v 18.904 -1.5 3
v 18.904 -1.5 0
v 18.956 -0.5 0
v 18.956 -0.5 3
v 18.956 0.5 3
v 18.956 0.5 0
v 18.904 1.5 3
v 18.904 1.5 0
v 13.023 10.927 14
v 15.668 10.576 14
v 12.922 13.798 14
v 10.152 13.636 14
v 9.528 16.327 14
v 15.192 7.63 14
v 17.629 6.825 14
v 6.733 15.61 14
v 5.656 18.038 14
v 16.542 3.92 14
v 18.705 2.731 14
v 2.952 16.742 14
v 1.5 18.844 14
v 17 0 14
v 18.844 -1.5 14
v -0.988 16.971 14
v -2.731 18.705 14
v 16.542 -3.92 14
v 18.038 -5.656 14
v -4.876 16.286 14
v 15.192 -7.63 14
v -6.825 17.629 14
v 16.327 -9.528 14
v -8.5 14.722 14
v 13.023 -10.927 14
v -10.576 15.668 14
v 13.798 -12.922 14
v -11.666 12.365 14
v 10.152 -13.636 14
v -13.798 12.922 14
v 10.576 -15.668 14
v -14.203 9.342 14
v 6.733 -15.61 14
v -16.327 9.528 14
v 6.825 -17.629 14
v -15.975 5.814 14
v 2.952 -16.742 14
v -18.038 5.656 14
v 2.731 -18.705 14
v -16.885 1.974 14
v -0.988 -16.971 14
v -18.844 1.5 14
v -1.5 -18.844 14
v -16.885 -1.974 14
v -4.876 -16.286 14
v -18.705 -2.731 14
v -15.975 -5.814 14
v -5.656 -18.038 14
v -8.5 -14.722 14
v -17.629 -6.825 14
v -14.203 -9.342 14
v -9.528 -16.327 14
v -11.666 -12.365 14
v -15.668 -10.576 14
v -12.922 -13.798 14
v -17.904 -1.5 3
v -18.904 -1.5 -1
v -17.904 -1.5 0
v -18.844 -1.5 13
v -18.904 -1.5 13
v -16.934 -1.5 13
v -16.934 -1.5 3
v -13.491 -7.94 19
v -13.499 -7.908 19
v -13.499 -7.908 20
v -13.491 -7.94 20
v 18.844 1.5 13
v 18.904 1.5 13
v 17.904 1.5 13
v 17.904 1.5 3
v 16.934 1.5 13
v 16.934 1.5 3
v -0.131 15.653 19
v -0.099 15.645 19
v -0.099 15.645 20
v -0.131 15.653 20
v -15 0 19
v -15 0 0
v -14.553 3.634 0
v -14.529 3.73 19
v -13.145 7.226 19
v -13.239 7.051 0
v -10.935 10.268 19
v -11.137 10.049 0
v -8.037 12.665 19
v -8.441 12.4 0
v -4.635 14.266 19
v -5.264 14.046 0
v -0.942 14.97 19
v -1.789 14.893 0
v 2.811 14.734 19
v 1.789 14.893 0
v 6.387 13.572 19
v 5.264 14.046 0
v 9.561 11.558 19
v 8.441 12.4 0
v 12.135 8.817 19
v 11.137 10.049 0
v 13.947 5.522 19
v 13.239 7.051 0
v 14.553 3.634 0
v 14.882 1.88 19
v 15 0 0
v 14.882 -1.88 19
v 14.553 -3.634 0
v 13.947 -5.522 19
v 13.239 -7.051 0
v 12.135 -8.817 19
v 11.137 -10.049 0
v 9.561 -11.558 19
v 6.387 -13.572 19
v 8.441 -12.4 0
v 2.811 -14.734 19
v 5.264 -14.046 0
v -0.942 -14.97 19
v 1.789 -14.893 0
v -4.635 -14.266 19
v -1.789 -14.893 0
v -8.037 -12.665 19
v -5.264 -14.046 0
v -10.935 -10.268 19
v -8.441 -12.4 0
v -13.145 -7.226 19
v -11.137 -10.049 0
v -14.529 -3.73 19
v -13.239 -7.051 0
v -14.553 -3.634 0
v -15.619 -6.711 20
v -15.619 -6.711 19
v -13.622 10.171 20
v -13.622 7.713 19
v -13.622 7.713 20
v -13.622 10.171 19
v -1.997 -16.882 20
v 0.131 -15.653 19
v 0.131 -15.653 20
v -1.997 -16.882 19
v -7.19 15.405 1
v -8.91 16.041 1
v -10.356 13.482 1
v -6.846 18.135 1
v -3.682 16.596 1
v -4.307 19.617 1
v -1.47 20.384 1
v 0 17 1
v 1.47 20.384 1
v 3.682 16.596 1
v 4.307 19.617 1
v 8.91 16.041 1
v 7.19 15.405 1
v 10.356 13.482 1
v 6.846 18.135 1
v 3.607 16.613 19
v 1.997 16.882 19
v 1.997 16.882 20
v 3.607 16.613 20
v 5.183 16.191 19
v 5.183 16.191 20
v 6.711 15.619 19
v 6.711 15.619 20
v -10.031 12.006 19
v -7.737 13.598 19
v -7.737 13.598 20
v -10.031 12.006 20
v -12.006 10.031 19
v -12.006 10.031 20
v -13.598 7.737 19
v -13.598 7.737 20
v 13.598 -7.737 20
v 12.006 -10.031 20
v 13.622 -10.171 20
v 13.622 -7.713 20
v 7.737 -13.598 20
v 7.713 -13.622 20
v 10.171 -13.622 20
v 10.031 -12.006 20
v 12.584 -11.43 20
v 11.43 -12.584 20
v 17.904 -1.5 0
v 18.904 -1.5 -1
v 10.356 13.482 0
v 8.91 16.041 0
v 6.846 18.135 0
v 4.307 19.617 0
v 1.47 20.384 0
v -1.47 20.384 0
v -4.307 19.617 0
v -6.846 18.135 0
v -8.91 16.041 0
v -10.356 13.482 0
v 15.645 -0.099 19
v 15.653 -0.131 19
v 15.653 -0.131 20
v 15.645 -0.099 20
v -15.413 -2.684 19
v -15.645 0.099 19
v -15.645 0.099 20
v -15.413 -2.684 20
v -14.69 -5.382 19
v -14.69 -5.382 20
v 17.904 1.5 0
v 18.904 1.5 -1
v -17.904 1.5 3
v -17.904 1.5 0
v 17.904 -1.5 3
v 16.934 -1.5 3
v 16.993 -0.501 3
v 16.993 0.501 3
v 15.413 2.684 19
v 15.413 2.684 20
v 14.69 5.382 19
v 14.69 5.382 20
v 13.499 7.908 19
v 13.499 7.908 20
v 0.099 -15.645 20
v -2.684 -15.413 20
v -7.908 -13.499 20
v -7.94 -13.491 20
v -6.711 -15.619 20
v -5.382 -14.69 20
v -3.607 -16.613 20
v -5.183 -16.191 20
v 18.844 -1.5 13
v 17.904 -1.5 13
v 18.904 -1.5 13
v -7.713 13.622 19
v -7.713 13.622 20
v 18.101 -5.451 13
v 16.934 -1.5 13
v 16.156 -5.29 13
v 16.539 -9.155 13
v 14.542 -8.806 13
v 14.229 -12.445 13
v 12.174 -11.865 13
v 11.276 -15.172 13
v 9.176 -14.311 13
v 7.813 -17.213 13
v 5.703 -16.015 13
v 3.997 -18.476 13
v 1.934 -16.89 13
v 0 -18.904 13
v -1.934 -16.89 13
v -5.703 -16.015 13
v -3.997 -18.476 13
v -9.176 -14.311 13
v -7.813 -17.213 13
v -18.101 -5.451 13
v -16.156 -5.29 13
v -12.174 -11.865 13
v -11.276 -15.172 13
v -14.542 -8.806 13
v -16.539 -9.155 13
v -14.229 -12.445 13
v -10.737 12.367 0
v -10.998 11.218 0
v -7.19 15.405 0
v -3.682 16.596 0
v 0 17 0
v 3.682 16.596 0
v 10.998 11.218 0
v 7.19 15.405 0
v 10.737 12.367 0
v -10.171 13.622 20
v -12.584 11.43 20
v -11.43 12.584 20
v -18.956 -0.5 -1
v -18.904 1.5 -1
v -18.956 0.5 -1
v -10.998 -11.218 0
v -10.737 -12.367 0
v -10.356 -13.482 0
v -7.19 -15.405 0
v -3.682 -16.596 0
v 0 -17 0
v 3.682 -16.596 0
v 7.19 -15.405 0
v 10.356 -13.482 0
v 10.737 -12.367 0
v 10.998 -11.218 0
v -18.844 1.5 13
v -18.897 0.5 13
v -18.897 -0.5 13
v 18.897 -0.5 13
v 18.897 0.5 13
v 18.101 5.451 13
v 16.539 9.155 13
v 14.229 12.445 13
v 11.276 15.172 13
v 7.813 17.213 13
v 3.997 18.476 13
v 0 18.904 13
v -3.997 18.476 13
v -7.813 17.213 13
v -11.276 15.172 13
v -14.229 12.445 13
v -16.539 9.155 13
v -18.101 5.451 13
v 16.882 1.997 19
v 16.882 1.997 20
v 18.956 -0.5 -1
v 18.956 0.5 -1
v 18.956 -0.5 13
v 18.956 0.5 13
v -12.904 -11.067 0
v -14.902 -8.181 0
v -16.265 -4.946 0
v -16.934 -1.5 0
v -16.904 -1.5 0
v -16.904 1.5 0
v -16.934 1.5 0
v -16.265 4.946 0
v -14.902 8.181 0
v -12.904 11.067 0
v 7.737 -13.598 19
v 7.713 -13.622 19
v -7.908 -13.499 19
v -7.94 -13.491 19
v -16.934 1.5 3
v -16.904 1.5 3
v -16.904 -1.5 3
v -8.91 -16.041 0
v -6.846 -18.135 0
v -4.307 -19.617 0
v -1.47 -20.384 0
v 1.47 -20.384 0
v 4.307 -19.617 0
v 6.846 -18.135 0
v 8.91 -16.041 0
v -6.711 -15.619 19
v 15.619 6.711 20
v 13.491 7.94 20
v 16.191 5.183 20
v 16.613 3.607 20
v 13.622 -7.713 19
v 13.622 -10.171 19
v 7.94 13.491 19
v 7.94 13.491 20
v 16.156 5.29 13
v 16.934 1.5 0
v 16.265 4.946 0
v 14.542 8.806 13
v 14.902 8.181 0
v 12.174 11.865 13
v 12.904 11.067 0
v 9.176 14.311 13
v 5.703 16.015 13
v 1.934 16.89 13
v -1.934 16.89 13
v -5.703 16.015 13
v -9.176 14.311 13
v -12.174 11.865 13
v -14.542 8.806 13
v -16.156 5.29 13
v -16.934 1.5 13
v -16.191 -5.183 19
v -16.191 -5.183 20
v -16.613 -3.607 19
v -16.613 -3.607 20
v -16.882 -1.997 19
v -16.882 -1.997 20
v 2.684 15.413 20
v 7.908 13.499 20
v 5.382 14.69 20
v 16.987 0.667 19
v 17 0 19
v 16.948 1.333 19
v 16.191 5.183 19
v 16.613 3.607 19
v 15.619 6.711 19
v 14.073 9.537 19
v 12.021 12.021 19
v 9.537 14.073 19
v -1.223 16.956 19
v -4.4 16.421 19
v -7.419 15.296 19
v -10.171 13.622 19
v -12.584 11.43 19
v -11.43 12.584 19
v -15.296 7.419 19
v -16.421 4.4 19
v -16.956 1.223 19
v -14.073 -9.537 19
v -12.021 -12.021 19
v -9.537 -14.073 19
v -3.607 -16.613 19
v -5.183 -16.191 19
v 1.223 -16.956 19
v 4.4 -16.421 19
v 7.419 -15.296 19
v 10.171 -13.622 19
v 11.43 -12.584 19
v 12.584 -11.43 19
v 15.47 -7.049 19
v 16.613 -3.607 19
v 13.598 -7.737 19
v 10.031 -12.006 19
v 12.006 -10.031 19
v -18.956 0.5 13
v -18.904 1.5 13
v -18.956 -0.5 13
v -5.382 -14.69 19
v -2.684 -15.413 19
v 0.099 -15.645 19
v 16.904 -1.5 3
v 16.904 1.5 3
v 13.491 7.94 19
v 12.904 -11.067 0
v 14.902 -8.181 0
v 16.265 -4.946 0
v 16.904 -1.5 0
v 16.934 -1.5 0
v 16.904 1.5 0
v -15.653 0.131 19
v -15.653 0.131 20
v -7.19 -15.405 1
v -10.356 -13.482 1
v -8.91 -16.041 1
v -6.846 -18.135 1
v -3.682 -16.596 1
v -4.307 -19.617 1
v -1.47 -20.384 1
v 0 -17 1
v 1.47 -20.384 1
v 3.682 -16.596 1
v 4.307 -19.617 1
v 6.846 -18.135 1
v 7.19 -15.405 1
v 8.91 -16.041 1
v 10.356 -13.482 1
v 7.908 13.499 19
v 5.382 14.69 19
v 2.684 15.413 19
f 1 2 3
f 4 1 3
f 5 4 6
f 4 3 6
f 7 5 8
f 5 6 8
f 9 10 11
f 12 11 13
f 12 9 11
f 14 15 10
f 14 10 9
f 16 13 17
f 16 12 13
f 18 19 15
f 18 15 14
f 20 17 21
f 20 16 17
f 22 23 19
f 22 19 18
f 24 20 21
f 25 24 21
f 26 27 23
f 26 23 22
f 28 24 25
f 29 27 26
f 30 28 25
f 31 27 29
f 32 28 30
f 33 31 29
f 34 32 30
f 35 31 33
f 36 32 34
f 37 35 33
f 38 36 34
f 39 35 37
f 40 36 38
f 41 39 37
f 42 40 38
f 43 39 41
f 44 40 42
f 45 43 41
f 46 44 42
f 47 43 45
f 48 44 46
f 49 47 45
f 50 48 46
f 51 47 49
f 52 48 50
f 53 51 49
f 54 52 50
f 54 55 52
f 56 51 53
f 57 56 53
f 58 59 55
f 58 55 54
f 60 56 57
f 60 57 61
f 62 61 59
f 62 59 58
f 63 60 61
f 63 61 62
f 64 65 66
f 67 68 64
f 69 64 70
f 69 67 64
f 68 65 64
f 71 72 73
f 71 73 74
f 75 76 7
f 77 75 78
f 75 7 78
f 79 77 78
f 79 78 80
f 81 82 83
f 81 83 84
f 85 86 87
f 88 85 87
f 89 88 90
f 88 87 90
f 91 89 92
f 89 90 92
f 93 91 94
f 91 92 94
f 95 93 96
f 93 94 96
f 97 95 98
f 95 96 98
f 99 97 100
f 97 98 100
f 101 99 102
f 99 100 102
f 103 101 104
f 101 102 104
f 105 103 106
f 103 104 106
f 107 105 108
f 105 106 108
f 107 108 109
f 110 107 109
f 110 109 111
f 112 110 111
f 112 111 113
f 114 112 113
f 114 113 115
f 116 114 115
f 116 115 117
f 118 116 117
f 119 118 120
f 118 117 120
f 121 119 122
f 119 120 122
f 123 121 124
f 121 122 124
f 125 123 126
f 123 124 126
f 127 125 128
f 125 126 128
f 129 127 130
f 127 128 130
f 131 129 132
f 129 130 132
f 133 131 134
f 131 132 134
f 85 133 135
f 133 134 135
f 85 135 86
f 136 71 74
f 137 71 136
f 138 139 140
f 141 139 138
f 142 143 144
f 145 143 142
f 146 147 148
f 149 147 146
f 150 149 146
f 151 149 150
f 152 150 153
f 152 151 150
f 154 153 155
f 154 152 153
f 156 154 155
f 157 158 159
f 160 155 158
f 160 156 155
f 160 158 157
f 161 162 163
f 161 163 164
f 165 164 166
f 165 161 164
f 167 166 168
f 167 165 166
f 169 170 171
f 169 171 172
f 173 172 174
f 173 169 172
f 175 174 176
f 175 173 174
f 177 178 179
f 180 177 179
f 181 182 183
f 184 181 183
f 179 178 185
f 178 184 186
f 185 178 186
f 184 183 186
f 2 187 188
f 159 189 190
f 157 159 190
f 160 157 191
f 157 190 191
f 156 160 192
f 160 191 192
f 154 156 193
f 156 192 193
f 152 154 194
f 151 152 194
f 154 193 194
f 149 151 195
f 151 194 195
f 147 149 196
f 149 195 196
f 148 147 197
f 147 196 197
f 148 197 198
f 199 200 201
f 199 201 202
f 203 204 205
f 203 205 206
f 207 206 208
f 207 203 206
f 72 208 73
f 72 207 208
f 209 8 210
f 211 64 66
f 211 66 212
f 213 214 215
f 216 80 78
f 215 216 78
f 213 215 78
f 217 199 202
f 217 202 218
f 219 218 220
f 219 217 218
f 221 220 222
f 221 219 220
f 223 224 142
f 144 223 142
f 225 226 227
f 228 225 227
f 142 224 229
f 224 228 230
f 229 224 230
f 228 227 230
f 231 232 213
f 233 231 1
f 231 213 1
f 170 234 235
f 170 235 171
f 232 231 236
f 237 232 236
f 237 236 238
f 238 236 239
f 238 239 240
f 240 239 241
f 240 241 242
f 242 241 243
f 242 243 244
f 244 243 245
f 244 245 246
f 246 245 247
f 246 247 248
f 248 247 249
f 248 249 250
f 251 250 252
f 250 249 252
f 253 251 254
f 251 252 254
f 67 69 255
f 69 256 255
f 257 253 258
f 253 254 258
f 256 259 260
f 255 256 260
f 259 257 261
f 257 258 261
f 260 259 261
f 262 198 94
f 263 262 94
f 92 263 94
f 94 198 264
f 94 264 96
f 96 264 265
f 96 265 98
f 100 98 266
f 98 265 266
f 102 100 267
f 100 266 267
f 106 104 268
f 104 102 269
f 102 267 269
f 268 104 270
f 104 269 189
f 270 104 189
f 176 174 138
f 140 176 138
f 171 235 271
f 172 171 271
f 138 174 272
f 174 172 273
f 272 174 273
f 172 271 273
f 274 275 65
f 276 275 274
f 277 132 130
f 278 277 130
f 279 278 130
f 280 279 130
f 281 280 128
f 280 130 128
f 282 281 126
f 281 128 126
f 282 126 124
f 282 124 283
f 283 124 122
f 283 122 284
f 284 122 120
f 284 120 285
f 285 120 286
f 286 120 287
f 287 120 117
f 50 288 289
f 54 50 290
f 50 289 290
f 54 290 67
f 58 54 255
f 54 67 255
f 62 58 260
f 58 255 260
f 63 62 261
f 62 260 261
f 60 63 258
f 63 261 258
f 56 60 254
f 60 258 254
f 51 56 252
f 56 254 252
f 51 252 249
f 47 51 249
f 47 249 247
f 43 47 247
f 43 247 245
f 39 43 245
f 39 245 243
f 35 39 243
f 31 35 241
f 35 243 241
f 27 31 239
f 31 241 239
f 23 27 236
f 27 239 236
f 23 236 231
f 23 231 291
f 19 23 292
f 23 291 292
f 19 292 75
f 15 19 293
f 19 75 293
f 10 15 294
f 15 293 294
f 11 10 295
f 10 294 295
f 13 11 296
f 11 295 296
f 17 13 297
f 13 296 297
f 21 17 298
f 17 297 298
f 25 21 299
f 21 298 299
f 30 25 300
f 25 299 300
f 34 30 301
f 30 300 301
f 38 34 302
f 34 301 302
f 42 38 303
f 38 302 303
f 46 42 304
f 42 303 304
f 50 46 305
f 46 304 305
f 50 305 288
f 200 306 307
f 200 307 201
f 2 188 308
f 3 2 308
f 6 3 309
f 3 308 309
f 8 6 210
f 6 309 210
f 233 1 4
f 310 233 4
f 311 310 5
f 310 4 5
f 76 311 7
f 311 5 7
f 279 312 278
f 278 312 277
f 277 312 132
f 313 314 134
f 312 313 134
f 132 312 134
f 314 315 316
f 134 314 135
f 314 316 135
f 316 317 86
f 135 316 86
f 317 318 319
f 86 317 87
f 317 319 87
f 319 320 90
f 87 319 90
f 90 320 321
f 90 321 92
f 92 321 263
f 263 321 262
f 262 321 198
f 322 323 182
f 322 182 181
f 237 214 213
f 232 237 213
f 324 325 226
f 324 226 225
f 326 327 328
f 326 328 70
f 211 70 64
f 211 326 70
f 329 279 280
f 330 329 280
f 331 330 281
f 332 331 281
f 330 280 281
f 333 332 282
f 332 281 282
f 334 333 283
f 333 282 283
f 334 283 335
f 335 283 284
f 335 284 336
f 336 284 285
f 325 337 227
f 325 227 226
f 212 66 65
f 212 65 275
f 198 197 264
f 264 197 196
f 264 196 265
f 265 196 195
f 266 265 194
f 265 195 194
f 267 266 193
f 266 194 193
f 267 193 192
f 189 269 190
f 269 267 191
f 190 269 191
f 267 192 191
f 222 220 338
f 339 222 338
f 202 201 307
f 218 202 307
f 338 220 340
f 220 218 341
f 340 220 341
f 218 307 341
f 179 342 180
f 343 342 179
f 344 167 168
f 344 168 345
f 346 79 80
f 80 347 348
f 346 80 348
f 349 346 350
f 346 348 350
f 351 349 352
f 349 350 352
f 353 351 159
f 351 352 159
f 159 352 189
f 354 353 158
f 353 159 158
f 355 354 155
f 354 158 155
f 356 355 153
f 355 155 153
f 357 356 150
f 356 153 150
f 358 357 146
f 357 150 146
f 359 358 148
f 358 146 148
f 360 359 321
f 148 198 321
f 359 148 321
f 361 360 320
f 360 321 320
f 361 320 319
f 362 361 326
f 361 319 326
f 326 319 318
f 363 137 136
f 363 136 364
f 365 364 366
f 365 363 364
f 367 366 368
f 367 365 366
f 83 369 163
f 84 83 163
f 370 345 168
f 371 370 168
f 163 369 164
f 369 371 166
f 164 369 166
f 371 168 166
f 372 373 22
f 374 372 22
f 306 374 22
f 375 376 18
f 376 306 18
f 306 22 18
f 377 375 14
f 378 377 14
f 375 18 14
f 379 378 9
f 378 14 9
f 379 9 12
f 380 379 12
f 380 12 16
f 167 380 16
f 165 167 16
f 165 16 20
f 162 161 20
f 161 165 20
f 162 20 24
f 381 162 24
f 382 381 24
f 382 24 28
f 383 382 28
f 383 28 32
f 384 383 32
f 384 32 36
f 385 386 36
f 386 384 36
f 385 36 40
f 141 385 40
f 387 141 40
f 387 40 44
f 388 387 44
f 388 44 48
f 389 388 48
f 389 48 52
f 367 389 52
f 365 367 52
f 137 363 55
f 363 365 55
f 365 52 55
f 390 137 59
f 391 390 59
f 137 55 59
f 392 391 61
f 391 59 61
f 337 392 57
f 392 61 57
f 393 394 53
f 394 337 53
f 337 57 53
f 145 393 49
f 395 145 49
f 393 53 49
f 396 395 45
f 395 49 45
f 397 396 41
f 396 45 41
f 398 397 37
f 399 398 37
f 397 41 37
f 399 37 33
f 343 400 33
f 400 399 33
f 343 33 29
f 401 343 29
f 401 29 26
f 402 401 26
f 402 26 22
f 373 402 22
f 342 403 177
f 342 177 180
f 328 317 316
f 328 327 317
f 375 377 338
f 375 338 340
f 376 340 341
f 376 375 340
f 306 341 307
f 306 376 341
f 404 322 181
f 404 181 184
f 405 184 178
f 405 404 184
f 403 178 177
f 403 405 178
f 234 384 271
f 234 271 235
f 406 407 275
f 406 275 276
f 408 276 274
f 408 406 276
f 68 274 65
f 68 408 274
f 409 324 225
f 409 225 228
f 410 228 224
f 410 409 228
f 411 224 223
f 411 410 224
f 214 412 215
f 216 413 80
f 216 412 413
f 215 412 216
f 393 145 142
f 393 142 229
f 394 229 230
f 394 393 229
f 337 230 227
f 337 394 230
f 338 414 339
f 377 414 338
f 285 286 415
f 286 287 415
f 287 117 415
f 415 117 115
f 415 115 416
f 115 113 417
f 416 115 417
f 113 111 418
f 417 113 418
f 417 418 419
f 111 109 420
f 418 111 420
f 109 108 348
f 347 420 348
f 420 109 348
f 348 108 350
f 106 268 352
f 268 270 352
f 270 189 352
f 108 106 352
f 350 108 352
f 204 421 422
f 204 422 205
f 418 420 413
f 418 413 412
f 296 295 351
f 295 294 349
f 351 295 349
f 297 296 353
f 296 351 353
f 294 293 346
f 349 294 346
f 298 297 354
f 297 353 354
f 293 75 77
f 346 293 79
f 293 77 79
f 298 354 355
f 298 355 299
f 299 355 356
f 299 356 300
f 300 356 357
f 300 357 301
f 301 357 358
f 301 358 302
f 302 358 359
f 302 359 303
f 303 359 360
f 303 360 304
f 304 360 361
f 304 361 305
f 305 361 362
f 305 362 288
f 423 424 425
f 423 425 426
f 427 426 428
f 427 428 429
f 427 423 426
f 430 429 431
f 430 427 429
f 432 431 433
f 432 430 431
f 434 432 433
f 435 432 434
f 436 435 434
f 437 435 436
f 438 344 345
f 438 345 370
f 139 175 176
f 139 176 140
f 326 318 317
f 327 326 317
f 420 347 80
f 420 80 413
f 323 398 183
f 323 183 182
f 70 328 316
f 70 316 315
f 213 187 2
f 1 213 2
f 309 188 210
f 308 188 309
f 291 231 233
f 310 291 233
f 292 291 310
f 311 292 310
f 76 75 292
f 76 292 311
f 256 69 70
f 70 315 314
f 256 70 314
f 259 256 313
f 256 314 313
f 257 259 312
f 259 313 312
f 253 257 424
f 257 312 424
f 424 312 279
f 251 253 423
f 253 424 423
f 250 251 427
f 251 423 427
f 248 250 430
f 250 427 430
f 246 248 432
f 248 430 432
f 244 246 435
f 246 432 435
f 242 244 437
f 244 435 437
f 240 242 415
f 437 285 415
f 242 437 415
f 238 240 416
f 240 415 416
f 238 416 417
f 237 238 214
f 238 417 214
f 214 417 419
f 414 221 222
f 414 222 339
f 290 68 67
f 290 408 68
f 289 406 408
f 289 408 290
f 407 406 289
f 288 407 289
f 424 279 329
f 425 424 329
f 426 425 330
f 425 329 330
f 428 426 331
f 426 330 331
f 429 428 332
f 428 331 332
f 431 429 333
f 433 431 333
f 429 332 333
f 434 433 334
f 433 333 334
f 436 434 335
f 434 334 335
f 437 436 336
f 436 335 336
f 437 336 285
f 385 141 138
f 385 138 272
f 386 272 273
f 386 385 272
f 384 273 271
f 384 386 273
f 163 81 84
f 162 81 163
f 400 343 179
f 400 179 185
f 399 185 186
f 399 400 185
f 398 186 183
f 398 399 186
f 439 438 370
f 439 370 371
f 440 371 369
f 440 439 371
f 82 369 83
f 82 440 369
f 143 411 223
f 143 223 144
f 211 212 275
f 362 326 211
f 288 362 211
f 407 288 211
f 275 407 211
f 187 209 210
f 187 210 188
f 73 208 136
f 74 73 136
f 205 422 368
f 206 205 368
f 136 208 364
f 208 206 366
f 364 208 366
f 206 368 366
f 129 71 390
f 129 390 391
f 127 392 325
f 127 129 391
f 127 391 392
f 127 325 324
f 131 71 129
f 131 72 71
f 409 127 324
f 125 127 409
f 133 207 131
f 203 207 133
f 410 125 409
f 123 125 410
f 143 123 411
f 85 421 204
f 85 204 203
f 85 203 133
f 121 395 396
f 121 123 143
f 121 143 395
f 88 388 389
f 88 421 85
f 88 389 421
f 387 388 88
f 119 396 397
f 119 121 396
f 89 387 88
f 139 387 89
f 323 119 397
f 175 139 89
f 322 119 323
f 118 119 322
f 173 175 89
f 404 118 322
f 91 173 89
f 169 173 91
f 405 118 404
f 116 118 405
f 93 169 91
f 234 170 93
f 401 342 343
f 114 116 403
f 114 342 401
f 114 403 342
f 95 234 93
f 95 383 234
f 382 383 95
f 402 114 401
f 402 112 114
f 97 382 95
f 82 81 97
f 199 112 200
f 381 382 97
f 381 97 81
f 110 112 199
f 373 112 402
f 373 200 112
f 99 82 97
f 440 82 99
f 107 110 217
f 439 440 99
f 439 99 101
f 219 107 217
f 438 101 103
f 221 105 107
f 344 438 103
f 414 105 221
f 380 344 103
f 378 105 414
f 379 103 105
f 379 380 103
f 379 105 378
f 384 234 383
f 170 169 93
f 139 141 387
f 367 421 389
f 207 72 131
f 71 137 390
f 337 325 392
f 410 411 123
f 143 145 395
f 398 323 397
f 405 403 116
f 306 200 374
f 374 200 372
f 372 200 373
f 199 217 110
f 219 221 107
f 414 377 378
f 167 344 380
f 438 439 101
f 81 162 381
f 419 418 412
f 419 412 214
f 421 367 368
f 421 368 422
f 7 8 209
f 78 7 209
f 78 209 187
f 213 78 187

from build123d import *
from OCP.BRepAlgoAPI import BRepAlgoAPI_Cut
from OCP.TopTools import TopTools_ListOfShape
from build123d.topology import SkipClean

# Parameters (mm, degrees)
SKETCH1_R           = 17
BOSS_EXTRUDE1_DEPTH = 19
BOSS_EXTRUDE3_DEPTH = 1
CIRPATTERN1_COUNT   = 6
BOSS_EXTRUDE4_START = -13
BOSS_EXTRUDE4_DEPTH = 14
CUT_EXTRUDE3_START  = -4
CUT_EXTRUDE3_DEPTH  = 4
CHAMFER1_SIZE       = 1
MIRROR1_START       = -1
MIRROR1_DEPTH       = 4
MIRROR1_START_2     = 3
MIRROR1_2_DEPTH     = 10
MIRROR1_3_DEPTH     = 3
MIRROR1_4_DEPTH     = 10
MIRROR1_5_DEPTH     = 1
MIRROR1_START_3     = 11.973929824
MIRROR1_6_OUTLINE_W = 2.659800733000001
MIRROR1_6_OUTLINE_H = 4.5
MIRROR1_6_DEPTH     = 2.142099975
SKETCH7_R           = 18.903661893109657
BOSS_EXTRUDE5_DEPTH = 1
BOSS_EXTRUDE7_DEPTH = 1
SKETCH2_R           = 15.000000000000002
CUT_EXTRUDE5_DEPTH  = 39


with BuildPart() as part:
    # Sketch1 → Boss-Extrude1 (new body)
    with BuildSketch(Plane.XY):
        Circle(SKETCH1_R)
    extrude(amount=BOSS_EXTRUDE1_DEPTH)

    # Sketch4 → Boss-Extrude3 (add)
    with SkipClean():  # the faces are left unmerged after this step: merging them gives an invalid solid
        with BuildSketch(Plane.XY.offset(19)):
            with BuildLine():
                Line((-10.170952539104004, 13.621737203723095), (-7.713345385435483, 13.621737203723095))
                Line((-7.713345385435483, 13.621737203723095), (-7.736883673253982, 13.598198915904591))
                ThreePointArc((-7.736883673253982, 13.598198915904591), (-11.062784069346495, 11.062784069346478), (-13.598198915904605, 7.736883673253956))
                Line((-13.598198915904605, 7.736883673253956), (-13.621737203723118, 7.7133453854354475))
                Line((-13.621737203723118, 7.7133453854354475), (-13.621737203723118, 10.17095253910397))
                ThreePointArc((-13.621737203723118, 10.17095253910397), (-12.020815280171325, 12.020815280171297), (-10.170952539104004, 13.621737203723095))
            make_face()
        boss_extrude3 = extrude(amount=BOSS_EXTRUDE3_DEPTH)

    # CirPattern1: Boss-Extrude3 ×6 about axis
    with SkipClean():  # the faces are left unmerged after this step: merging them gives an invalid solid
        cirpattern1_axis = Axis((-2.8e-16, 1e-17, 0), (0, 0, 1))
        for i in range(1, CIRPATTERN1_COUNT):
            add(boss_extrude3.rotate(cirpattern1_axis, i * 360 / CIRPATTERN1_COUNT))

    # Sketch5 → Boss-Extrude4 (add)
    with SkipClean():  # the faces are left unmerged after this step: merging them gives an invalid solid
        with BuildSketch(Plane(origin=(0, 0, 0), x_dir=(-1, 0, 0), z_dir=(0, 0, -1)).offset(BOSS_EXTRUDE4_START)):
            with BuildLine():
                Line((16.903661893109657, 1.5), (18.903661893109657, 1.5))
                ThreePointArc((18.903661893109657, 1.5), (18.963080787915402, 0), (18.903661893109657, -1.5))
                Line((18.903661893109657, -1.5), (16.903661893109657, -1.5))
                Line((16.903661893109657, -1.5), (16.903661893109657, 1.5))
            make_face()
        extrude(amount=BOSS_EXTRUDE4_DEPTH)


with BuildPart() as cut_extrude3_tool:
    # Cut-Extrude3: read off the stored shape, not the designer's step
    # Cut-Extrude3 outline → Cut-Extrude3 (new body)
    with BuildSketch(Plane(origin=(0, 0, -1), x_dir=(-1, 0, 0), z_dir=(0, 0, -1)).offset(CUT_EXTRUDE3_START)):
        Polygon((17.903661893, 1.5), (16.903661893, 1.500007564), (16.903661893, -1.5), (17.903661893, -1.5), align=None)
    extrude(amount=CUT_EXTRUDE3_DEPTH)


with BuildPart() as part_1:
    add(part.part)

    # Cut-Extrude3: cut by cut_extrude3_tool, with a tolerance
    cut_extrude3_stock = TopTools_ListOfShape()
    cut_extrude3_stock.Append(part_1.part.wrapped)
    cut_extrude3_tools = TopTools_ListOfShape()
    cut_extrude3_tools.Append(cut_extrude3_tool.part.wrapped)
    cut_extrude3_cut = BRepAlgoAPI_Cut()
    cut_extrude3_cut.SetArguments(cut_extrude3_stock)
    cut_extrude3_cut.SetTools(cut_extrude3_tools)
    cut_extrude3_cut.SetFuzzyValue(0.00001)
    cut_extrude3_cut.Build()
    add(Compound.cast(cut_extrude3_cut.Shape()).solids(), mode=Mode.REPLACE)

    # Chamfer1
    chamfer1_edges = [part_1.edges().sort_by_distance(p)[0] for p in [
        (-17.903661893, 0, -1),
    ]]
    chamfer(chamfer1_edges, length=CHAMFER1_SIZE)


with BuildPart() as mirror1_tool:
    # Mirror1: read off the stored shape, not the designer's step
    # Mirror1 outline → Mirror1 (new body)
    with BuildSketch(Plane.XY.offset(MIRROR1_START)):
        Polygon((16.903661893, -1.5), (17.903661893, -1.5), (17.903661893, 1.5), (16.933693552, 1.5), (16.903661893, 1.500015127), align=None)
    extrude(amount=MIRROR1_DEPTH)


with BuildPart() as part_2:
    add(part_1.part)

    # Mirror1: cut by mirror1_tool, with a tolerance
    mirror1_stock = TopTools_ListOfShape()
    mirror1_stock.Append(part_2.part.wrapped)
    mirror1_tools = TopTools_ListOfShape()
    mirror1_tools.Append(mirror1_tool.part.wrapped)
    mirror1_cut = BRepAlgoAPI_Cut()
    mirror1_cut.SetArguments(mirror1_stock)
    mirror1_cut.SetTools(mirror1_tools)
    mirror1_cut.SetFuzzyValue(0.00001)
    mirror1_cut.Build()
    add(Compound.cast(mirror1_cut.Shape()).solids(), mode=Mode.REPLACE)


with BuildPart() as mirror1_2_tool:
    # Mirror1 2 outline → Mirror1 2 (new body)
    with SkipClean():  # the faces are left unmerged after this step: merging them gives an invalid solid
        with BuildSketch(Plane.XY.offset(MIRROR1_START_2)):
            Polygon((16.903661893, -1.5), (17.903661893, -1.5), (17.903661893, 1.5), (16.933693552, 1.5), (16.903661893, 1.500015127), align=None)
            with BuildLine():
                Line((17.903661893, 1.5), (17.903661893, -1.5))
                Line((17.903661893, -1.5), (18.903661893, -1.5))
                ThreePointArc((18.903661893, -1.5), (18.963080788, 0), (18.903661893, 1.5))
                Line((18.903661893, 1.5), (17.903661893, 1.5))
            make_face()
        extrude(amount=MIRROR1_2_DEPTH)


with BuildPart() as part_3:
    with SkipClean():  # the faces are left unmerged after this step: merging them gives an invalid solid
        add(part_2.part)


with BuildPart() as part_4:
    # Mirror1 2: joined with mirror1_2_tool
    with SkipClean():  # the faces are left unmerged after this step: merging them gives an invalid solid
        add(part_3.part.fuse(mirror1_2_tool.part, tol=0.00001))


with BuildPart() as mirror1_3_tool:
    # Mirror1 3 outline → Mirror1 3 (new body)
    with SkipClean():  # the faces are left unmerged after this step: merging them gives an invalid solid
        with BuildSketch(Plane.XY):
            with BuildLine():
                Line((17.903661893, 1.5), (17.903661893, -1.5))
                Line((17.903661893, -1.5), (18.903661893, -1.5))
                ThreePointArc((18.903661893, -1.5), (18.963080788, 0), (18.903661893, 1.5))
                Line((18.903661893, 1.5), (17.903661893, 1.5))
            make_face()
        extrude(amount=MIRROR1_3_DEPTH)


with BuildPart() as part_5:
    with SkipClean():  # the faces are left unmerged after this step: merging them gives an invalid solid
        add(part_4.part)


with BuildPart() as part_6:
    # Mirror1 3: joined with mirror1_3_tool
    with SkipClean():  # the faces are left unmerged after this step: merging them gives an invalid solid
        add(part_5.part.fuse(mirror1_3_tool.part, tol=0.00001))


with BuildPart() as mirror1_4_tool:
    # Mirror1 4 outline → Mirror1 4 (new body)
    with SkipClean():  # the faces are left unmerged after this step: merging them gives an invalid solid
        with BuildSketch(Plane.XY.offset(MIRROR1_START_2)):
            with BuildLine():
                ThreePointArc((16.933693952, 1.500003049), (17, 1.53e-06), (16.933694222, -1.5))
                Line((16.933694222, -1.5), (18.903661893, -1.5))
                ThreePointArc((18.903661893, -1.5), (18.963080788, 0), (18.903661893, 1.5))
                Line((18.903661893, 1.5), (16.933693952, 1.500003049))
            make_face()
        extrude(amount=MIRROR1_4_DEPTH)


with BuildPart() as part_7:
    with SkipClean():  # the faces are left unmerged after this step: merging them gives an invalid solid
        add(part_6.part)


with BuildPart() as part_8:
    # Mirror1 4: joined with mirror1_4_tool
    with SkipClean():  # the faces are left unmerged after this step: merging them gives an invalid solid
        add(part_7.part.fuse(mirror1_4_tool.part, tol=0.00001))


with BuildPart() as mirror1_5_tool:
    # Mirror1 5 outline → Mirror1 5 (new body)
    with SkipClean():  # the faces are left unmerged after this step: merging them gives an invalid solid
        with BuildSketch(Plane.XY.offset(MIRROR1_START)):
            with BuildLine():
                ThreePointArc((16.933693952, 1.500003049), (17, 1.53e-06), (16.933694222, -1.5))
                Line((16.933694222, -1.5), (18.903661893, -1.5))
                ThreePointArc((18.903661893, -1.5), (18.963080788, 0), (18.903661893, 1.5))
                Line((18.903661893, 1.5), (16.933693952, 1.500003049))
            make_face()
        extrude(amount=MIRROR1_5_DEPTH)


with BuildPart() as part_9:
    with SkipClean():  # the faces are left unmerged after this step: merging them gives an invalid solid
        add(part_8.part)


with BuildPart() as part_10:
    # Mirror1 5: joined with mirror1_5_tool
    with SkipClean():  # the faces are left unmerged after this step: merging them gives an invalid solid
        add(part_9.part.fuse(mirror1_5_tool.part, tol=0.00001))


with BuildPart() as mirror1_6_tool:
    # Mirror1 6 outline → Mirror1 6 (new body)
    with BuildSketch(Plane(origin=(0, 0, 0), x_dir=(0.707106781186545, 0, 0.70710678118655), z_dir=(0.70710678118655, 0, -0.707106781186545)).offset(MIRROR1_START_3)):
        with Locations((11.3299003665, 0.75)):
            Rectangle(MIRROR1_6_OUTLINE_W, MIRROR1_6_OUTLINE_H)
    extrude(amount=MIRROR1_6_DEPTH)


with BuildPart() as part_11:
    add(part_10.part)

    # Mirror1 6: cut by mirror1_6_tool, with a tolerance
    mirror1_6_stock = TopTools_ListOfShape()
    mirror1_6_stock.Append(part_11.part.wrapped)
    mirror1_6_tools = TopTools_ListOfShape()
    mirror1_6_tools.Append(mirror1_6_tool.part.wrapped)
    mirror1_6_cut = BRepAlgoAPI_Cut()
    mirror1_6_cut.SetArguments(mirror1_6_stock)
    mirror1_6_cut.SetTools(mirror1_6_tools)
    mirror1_6_cut.SetFuzzyValue(0.00001)
    mirror1_6_cut.Build()
    add(Compound.cast(mirror1_6_cut.Shape()).solids(), mode=Mode.REPLACE)

    # Sketch7 → Boss-Extrude5 (add)
    with SkipClean():  # the faces are left unmerged after this step: merging them gives an invalid solid
        with BuildSketch(Plane.XY.offset(13)):
            with Locations(Location((0, 0, 0), (0, 0, 175.448812236))):
                Circle(SKETCH7_R)
        extrude(amount=BOSS_EXTRUDE5_DEPTH)

    # Sketch11 → Boss-Extrude7 (add)
    with SkipClean():  # the faces are left unmerged after this step: merging them gives an invalid solid
        with BuildSketch(Plane(origin=(0, 0, 0), x_dir=(-1, 0, 0), z_dir=(0, 0, -1))):
            with BuildLine():
                Line((11.160404315577848, 9.320876818848085), (11.160404315577848, -9.320876818848085))
                ThreePointArc((11.160404315577848, -9.320876818848085), (-2.05e-15, -20.481281134425934), (-11.160404315577848, -9.320876818848085))
                Line((-11.160404315577848, -9.320876818848085), (-11.160404315577848, 9.320876818848085))
                ThreePointArc((-11.160404315577848, 9.320876818848085), (6.8e-16, 20.481281134425934), (11.160404315577848, 9.320876818848085))
            make_face()
        extrude(amount=-BOSS_EXTRUDE7_DEPTH)

    # Sketch2 → Cut-Extrude5 (cut)
    with SkipClean():  # the faces are left unmerged after this step: merging them gives an invalid solid
        with BuildSketch(Plane(origin=(0, 0, 0), x_dir=(-1, 0, 0), z_dir=(0, 0, -1))):
            Circle(SKETCH2_R)
        extrude(amount=-CUT_EXTRUDE5_DEPTH, mode=Mode.SUBTRACT)


solid = part_11.part
